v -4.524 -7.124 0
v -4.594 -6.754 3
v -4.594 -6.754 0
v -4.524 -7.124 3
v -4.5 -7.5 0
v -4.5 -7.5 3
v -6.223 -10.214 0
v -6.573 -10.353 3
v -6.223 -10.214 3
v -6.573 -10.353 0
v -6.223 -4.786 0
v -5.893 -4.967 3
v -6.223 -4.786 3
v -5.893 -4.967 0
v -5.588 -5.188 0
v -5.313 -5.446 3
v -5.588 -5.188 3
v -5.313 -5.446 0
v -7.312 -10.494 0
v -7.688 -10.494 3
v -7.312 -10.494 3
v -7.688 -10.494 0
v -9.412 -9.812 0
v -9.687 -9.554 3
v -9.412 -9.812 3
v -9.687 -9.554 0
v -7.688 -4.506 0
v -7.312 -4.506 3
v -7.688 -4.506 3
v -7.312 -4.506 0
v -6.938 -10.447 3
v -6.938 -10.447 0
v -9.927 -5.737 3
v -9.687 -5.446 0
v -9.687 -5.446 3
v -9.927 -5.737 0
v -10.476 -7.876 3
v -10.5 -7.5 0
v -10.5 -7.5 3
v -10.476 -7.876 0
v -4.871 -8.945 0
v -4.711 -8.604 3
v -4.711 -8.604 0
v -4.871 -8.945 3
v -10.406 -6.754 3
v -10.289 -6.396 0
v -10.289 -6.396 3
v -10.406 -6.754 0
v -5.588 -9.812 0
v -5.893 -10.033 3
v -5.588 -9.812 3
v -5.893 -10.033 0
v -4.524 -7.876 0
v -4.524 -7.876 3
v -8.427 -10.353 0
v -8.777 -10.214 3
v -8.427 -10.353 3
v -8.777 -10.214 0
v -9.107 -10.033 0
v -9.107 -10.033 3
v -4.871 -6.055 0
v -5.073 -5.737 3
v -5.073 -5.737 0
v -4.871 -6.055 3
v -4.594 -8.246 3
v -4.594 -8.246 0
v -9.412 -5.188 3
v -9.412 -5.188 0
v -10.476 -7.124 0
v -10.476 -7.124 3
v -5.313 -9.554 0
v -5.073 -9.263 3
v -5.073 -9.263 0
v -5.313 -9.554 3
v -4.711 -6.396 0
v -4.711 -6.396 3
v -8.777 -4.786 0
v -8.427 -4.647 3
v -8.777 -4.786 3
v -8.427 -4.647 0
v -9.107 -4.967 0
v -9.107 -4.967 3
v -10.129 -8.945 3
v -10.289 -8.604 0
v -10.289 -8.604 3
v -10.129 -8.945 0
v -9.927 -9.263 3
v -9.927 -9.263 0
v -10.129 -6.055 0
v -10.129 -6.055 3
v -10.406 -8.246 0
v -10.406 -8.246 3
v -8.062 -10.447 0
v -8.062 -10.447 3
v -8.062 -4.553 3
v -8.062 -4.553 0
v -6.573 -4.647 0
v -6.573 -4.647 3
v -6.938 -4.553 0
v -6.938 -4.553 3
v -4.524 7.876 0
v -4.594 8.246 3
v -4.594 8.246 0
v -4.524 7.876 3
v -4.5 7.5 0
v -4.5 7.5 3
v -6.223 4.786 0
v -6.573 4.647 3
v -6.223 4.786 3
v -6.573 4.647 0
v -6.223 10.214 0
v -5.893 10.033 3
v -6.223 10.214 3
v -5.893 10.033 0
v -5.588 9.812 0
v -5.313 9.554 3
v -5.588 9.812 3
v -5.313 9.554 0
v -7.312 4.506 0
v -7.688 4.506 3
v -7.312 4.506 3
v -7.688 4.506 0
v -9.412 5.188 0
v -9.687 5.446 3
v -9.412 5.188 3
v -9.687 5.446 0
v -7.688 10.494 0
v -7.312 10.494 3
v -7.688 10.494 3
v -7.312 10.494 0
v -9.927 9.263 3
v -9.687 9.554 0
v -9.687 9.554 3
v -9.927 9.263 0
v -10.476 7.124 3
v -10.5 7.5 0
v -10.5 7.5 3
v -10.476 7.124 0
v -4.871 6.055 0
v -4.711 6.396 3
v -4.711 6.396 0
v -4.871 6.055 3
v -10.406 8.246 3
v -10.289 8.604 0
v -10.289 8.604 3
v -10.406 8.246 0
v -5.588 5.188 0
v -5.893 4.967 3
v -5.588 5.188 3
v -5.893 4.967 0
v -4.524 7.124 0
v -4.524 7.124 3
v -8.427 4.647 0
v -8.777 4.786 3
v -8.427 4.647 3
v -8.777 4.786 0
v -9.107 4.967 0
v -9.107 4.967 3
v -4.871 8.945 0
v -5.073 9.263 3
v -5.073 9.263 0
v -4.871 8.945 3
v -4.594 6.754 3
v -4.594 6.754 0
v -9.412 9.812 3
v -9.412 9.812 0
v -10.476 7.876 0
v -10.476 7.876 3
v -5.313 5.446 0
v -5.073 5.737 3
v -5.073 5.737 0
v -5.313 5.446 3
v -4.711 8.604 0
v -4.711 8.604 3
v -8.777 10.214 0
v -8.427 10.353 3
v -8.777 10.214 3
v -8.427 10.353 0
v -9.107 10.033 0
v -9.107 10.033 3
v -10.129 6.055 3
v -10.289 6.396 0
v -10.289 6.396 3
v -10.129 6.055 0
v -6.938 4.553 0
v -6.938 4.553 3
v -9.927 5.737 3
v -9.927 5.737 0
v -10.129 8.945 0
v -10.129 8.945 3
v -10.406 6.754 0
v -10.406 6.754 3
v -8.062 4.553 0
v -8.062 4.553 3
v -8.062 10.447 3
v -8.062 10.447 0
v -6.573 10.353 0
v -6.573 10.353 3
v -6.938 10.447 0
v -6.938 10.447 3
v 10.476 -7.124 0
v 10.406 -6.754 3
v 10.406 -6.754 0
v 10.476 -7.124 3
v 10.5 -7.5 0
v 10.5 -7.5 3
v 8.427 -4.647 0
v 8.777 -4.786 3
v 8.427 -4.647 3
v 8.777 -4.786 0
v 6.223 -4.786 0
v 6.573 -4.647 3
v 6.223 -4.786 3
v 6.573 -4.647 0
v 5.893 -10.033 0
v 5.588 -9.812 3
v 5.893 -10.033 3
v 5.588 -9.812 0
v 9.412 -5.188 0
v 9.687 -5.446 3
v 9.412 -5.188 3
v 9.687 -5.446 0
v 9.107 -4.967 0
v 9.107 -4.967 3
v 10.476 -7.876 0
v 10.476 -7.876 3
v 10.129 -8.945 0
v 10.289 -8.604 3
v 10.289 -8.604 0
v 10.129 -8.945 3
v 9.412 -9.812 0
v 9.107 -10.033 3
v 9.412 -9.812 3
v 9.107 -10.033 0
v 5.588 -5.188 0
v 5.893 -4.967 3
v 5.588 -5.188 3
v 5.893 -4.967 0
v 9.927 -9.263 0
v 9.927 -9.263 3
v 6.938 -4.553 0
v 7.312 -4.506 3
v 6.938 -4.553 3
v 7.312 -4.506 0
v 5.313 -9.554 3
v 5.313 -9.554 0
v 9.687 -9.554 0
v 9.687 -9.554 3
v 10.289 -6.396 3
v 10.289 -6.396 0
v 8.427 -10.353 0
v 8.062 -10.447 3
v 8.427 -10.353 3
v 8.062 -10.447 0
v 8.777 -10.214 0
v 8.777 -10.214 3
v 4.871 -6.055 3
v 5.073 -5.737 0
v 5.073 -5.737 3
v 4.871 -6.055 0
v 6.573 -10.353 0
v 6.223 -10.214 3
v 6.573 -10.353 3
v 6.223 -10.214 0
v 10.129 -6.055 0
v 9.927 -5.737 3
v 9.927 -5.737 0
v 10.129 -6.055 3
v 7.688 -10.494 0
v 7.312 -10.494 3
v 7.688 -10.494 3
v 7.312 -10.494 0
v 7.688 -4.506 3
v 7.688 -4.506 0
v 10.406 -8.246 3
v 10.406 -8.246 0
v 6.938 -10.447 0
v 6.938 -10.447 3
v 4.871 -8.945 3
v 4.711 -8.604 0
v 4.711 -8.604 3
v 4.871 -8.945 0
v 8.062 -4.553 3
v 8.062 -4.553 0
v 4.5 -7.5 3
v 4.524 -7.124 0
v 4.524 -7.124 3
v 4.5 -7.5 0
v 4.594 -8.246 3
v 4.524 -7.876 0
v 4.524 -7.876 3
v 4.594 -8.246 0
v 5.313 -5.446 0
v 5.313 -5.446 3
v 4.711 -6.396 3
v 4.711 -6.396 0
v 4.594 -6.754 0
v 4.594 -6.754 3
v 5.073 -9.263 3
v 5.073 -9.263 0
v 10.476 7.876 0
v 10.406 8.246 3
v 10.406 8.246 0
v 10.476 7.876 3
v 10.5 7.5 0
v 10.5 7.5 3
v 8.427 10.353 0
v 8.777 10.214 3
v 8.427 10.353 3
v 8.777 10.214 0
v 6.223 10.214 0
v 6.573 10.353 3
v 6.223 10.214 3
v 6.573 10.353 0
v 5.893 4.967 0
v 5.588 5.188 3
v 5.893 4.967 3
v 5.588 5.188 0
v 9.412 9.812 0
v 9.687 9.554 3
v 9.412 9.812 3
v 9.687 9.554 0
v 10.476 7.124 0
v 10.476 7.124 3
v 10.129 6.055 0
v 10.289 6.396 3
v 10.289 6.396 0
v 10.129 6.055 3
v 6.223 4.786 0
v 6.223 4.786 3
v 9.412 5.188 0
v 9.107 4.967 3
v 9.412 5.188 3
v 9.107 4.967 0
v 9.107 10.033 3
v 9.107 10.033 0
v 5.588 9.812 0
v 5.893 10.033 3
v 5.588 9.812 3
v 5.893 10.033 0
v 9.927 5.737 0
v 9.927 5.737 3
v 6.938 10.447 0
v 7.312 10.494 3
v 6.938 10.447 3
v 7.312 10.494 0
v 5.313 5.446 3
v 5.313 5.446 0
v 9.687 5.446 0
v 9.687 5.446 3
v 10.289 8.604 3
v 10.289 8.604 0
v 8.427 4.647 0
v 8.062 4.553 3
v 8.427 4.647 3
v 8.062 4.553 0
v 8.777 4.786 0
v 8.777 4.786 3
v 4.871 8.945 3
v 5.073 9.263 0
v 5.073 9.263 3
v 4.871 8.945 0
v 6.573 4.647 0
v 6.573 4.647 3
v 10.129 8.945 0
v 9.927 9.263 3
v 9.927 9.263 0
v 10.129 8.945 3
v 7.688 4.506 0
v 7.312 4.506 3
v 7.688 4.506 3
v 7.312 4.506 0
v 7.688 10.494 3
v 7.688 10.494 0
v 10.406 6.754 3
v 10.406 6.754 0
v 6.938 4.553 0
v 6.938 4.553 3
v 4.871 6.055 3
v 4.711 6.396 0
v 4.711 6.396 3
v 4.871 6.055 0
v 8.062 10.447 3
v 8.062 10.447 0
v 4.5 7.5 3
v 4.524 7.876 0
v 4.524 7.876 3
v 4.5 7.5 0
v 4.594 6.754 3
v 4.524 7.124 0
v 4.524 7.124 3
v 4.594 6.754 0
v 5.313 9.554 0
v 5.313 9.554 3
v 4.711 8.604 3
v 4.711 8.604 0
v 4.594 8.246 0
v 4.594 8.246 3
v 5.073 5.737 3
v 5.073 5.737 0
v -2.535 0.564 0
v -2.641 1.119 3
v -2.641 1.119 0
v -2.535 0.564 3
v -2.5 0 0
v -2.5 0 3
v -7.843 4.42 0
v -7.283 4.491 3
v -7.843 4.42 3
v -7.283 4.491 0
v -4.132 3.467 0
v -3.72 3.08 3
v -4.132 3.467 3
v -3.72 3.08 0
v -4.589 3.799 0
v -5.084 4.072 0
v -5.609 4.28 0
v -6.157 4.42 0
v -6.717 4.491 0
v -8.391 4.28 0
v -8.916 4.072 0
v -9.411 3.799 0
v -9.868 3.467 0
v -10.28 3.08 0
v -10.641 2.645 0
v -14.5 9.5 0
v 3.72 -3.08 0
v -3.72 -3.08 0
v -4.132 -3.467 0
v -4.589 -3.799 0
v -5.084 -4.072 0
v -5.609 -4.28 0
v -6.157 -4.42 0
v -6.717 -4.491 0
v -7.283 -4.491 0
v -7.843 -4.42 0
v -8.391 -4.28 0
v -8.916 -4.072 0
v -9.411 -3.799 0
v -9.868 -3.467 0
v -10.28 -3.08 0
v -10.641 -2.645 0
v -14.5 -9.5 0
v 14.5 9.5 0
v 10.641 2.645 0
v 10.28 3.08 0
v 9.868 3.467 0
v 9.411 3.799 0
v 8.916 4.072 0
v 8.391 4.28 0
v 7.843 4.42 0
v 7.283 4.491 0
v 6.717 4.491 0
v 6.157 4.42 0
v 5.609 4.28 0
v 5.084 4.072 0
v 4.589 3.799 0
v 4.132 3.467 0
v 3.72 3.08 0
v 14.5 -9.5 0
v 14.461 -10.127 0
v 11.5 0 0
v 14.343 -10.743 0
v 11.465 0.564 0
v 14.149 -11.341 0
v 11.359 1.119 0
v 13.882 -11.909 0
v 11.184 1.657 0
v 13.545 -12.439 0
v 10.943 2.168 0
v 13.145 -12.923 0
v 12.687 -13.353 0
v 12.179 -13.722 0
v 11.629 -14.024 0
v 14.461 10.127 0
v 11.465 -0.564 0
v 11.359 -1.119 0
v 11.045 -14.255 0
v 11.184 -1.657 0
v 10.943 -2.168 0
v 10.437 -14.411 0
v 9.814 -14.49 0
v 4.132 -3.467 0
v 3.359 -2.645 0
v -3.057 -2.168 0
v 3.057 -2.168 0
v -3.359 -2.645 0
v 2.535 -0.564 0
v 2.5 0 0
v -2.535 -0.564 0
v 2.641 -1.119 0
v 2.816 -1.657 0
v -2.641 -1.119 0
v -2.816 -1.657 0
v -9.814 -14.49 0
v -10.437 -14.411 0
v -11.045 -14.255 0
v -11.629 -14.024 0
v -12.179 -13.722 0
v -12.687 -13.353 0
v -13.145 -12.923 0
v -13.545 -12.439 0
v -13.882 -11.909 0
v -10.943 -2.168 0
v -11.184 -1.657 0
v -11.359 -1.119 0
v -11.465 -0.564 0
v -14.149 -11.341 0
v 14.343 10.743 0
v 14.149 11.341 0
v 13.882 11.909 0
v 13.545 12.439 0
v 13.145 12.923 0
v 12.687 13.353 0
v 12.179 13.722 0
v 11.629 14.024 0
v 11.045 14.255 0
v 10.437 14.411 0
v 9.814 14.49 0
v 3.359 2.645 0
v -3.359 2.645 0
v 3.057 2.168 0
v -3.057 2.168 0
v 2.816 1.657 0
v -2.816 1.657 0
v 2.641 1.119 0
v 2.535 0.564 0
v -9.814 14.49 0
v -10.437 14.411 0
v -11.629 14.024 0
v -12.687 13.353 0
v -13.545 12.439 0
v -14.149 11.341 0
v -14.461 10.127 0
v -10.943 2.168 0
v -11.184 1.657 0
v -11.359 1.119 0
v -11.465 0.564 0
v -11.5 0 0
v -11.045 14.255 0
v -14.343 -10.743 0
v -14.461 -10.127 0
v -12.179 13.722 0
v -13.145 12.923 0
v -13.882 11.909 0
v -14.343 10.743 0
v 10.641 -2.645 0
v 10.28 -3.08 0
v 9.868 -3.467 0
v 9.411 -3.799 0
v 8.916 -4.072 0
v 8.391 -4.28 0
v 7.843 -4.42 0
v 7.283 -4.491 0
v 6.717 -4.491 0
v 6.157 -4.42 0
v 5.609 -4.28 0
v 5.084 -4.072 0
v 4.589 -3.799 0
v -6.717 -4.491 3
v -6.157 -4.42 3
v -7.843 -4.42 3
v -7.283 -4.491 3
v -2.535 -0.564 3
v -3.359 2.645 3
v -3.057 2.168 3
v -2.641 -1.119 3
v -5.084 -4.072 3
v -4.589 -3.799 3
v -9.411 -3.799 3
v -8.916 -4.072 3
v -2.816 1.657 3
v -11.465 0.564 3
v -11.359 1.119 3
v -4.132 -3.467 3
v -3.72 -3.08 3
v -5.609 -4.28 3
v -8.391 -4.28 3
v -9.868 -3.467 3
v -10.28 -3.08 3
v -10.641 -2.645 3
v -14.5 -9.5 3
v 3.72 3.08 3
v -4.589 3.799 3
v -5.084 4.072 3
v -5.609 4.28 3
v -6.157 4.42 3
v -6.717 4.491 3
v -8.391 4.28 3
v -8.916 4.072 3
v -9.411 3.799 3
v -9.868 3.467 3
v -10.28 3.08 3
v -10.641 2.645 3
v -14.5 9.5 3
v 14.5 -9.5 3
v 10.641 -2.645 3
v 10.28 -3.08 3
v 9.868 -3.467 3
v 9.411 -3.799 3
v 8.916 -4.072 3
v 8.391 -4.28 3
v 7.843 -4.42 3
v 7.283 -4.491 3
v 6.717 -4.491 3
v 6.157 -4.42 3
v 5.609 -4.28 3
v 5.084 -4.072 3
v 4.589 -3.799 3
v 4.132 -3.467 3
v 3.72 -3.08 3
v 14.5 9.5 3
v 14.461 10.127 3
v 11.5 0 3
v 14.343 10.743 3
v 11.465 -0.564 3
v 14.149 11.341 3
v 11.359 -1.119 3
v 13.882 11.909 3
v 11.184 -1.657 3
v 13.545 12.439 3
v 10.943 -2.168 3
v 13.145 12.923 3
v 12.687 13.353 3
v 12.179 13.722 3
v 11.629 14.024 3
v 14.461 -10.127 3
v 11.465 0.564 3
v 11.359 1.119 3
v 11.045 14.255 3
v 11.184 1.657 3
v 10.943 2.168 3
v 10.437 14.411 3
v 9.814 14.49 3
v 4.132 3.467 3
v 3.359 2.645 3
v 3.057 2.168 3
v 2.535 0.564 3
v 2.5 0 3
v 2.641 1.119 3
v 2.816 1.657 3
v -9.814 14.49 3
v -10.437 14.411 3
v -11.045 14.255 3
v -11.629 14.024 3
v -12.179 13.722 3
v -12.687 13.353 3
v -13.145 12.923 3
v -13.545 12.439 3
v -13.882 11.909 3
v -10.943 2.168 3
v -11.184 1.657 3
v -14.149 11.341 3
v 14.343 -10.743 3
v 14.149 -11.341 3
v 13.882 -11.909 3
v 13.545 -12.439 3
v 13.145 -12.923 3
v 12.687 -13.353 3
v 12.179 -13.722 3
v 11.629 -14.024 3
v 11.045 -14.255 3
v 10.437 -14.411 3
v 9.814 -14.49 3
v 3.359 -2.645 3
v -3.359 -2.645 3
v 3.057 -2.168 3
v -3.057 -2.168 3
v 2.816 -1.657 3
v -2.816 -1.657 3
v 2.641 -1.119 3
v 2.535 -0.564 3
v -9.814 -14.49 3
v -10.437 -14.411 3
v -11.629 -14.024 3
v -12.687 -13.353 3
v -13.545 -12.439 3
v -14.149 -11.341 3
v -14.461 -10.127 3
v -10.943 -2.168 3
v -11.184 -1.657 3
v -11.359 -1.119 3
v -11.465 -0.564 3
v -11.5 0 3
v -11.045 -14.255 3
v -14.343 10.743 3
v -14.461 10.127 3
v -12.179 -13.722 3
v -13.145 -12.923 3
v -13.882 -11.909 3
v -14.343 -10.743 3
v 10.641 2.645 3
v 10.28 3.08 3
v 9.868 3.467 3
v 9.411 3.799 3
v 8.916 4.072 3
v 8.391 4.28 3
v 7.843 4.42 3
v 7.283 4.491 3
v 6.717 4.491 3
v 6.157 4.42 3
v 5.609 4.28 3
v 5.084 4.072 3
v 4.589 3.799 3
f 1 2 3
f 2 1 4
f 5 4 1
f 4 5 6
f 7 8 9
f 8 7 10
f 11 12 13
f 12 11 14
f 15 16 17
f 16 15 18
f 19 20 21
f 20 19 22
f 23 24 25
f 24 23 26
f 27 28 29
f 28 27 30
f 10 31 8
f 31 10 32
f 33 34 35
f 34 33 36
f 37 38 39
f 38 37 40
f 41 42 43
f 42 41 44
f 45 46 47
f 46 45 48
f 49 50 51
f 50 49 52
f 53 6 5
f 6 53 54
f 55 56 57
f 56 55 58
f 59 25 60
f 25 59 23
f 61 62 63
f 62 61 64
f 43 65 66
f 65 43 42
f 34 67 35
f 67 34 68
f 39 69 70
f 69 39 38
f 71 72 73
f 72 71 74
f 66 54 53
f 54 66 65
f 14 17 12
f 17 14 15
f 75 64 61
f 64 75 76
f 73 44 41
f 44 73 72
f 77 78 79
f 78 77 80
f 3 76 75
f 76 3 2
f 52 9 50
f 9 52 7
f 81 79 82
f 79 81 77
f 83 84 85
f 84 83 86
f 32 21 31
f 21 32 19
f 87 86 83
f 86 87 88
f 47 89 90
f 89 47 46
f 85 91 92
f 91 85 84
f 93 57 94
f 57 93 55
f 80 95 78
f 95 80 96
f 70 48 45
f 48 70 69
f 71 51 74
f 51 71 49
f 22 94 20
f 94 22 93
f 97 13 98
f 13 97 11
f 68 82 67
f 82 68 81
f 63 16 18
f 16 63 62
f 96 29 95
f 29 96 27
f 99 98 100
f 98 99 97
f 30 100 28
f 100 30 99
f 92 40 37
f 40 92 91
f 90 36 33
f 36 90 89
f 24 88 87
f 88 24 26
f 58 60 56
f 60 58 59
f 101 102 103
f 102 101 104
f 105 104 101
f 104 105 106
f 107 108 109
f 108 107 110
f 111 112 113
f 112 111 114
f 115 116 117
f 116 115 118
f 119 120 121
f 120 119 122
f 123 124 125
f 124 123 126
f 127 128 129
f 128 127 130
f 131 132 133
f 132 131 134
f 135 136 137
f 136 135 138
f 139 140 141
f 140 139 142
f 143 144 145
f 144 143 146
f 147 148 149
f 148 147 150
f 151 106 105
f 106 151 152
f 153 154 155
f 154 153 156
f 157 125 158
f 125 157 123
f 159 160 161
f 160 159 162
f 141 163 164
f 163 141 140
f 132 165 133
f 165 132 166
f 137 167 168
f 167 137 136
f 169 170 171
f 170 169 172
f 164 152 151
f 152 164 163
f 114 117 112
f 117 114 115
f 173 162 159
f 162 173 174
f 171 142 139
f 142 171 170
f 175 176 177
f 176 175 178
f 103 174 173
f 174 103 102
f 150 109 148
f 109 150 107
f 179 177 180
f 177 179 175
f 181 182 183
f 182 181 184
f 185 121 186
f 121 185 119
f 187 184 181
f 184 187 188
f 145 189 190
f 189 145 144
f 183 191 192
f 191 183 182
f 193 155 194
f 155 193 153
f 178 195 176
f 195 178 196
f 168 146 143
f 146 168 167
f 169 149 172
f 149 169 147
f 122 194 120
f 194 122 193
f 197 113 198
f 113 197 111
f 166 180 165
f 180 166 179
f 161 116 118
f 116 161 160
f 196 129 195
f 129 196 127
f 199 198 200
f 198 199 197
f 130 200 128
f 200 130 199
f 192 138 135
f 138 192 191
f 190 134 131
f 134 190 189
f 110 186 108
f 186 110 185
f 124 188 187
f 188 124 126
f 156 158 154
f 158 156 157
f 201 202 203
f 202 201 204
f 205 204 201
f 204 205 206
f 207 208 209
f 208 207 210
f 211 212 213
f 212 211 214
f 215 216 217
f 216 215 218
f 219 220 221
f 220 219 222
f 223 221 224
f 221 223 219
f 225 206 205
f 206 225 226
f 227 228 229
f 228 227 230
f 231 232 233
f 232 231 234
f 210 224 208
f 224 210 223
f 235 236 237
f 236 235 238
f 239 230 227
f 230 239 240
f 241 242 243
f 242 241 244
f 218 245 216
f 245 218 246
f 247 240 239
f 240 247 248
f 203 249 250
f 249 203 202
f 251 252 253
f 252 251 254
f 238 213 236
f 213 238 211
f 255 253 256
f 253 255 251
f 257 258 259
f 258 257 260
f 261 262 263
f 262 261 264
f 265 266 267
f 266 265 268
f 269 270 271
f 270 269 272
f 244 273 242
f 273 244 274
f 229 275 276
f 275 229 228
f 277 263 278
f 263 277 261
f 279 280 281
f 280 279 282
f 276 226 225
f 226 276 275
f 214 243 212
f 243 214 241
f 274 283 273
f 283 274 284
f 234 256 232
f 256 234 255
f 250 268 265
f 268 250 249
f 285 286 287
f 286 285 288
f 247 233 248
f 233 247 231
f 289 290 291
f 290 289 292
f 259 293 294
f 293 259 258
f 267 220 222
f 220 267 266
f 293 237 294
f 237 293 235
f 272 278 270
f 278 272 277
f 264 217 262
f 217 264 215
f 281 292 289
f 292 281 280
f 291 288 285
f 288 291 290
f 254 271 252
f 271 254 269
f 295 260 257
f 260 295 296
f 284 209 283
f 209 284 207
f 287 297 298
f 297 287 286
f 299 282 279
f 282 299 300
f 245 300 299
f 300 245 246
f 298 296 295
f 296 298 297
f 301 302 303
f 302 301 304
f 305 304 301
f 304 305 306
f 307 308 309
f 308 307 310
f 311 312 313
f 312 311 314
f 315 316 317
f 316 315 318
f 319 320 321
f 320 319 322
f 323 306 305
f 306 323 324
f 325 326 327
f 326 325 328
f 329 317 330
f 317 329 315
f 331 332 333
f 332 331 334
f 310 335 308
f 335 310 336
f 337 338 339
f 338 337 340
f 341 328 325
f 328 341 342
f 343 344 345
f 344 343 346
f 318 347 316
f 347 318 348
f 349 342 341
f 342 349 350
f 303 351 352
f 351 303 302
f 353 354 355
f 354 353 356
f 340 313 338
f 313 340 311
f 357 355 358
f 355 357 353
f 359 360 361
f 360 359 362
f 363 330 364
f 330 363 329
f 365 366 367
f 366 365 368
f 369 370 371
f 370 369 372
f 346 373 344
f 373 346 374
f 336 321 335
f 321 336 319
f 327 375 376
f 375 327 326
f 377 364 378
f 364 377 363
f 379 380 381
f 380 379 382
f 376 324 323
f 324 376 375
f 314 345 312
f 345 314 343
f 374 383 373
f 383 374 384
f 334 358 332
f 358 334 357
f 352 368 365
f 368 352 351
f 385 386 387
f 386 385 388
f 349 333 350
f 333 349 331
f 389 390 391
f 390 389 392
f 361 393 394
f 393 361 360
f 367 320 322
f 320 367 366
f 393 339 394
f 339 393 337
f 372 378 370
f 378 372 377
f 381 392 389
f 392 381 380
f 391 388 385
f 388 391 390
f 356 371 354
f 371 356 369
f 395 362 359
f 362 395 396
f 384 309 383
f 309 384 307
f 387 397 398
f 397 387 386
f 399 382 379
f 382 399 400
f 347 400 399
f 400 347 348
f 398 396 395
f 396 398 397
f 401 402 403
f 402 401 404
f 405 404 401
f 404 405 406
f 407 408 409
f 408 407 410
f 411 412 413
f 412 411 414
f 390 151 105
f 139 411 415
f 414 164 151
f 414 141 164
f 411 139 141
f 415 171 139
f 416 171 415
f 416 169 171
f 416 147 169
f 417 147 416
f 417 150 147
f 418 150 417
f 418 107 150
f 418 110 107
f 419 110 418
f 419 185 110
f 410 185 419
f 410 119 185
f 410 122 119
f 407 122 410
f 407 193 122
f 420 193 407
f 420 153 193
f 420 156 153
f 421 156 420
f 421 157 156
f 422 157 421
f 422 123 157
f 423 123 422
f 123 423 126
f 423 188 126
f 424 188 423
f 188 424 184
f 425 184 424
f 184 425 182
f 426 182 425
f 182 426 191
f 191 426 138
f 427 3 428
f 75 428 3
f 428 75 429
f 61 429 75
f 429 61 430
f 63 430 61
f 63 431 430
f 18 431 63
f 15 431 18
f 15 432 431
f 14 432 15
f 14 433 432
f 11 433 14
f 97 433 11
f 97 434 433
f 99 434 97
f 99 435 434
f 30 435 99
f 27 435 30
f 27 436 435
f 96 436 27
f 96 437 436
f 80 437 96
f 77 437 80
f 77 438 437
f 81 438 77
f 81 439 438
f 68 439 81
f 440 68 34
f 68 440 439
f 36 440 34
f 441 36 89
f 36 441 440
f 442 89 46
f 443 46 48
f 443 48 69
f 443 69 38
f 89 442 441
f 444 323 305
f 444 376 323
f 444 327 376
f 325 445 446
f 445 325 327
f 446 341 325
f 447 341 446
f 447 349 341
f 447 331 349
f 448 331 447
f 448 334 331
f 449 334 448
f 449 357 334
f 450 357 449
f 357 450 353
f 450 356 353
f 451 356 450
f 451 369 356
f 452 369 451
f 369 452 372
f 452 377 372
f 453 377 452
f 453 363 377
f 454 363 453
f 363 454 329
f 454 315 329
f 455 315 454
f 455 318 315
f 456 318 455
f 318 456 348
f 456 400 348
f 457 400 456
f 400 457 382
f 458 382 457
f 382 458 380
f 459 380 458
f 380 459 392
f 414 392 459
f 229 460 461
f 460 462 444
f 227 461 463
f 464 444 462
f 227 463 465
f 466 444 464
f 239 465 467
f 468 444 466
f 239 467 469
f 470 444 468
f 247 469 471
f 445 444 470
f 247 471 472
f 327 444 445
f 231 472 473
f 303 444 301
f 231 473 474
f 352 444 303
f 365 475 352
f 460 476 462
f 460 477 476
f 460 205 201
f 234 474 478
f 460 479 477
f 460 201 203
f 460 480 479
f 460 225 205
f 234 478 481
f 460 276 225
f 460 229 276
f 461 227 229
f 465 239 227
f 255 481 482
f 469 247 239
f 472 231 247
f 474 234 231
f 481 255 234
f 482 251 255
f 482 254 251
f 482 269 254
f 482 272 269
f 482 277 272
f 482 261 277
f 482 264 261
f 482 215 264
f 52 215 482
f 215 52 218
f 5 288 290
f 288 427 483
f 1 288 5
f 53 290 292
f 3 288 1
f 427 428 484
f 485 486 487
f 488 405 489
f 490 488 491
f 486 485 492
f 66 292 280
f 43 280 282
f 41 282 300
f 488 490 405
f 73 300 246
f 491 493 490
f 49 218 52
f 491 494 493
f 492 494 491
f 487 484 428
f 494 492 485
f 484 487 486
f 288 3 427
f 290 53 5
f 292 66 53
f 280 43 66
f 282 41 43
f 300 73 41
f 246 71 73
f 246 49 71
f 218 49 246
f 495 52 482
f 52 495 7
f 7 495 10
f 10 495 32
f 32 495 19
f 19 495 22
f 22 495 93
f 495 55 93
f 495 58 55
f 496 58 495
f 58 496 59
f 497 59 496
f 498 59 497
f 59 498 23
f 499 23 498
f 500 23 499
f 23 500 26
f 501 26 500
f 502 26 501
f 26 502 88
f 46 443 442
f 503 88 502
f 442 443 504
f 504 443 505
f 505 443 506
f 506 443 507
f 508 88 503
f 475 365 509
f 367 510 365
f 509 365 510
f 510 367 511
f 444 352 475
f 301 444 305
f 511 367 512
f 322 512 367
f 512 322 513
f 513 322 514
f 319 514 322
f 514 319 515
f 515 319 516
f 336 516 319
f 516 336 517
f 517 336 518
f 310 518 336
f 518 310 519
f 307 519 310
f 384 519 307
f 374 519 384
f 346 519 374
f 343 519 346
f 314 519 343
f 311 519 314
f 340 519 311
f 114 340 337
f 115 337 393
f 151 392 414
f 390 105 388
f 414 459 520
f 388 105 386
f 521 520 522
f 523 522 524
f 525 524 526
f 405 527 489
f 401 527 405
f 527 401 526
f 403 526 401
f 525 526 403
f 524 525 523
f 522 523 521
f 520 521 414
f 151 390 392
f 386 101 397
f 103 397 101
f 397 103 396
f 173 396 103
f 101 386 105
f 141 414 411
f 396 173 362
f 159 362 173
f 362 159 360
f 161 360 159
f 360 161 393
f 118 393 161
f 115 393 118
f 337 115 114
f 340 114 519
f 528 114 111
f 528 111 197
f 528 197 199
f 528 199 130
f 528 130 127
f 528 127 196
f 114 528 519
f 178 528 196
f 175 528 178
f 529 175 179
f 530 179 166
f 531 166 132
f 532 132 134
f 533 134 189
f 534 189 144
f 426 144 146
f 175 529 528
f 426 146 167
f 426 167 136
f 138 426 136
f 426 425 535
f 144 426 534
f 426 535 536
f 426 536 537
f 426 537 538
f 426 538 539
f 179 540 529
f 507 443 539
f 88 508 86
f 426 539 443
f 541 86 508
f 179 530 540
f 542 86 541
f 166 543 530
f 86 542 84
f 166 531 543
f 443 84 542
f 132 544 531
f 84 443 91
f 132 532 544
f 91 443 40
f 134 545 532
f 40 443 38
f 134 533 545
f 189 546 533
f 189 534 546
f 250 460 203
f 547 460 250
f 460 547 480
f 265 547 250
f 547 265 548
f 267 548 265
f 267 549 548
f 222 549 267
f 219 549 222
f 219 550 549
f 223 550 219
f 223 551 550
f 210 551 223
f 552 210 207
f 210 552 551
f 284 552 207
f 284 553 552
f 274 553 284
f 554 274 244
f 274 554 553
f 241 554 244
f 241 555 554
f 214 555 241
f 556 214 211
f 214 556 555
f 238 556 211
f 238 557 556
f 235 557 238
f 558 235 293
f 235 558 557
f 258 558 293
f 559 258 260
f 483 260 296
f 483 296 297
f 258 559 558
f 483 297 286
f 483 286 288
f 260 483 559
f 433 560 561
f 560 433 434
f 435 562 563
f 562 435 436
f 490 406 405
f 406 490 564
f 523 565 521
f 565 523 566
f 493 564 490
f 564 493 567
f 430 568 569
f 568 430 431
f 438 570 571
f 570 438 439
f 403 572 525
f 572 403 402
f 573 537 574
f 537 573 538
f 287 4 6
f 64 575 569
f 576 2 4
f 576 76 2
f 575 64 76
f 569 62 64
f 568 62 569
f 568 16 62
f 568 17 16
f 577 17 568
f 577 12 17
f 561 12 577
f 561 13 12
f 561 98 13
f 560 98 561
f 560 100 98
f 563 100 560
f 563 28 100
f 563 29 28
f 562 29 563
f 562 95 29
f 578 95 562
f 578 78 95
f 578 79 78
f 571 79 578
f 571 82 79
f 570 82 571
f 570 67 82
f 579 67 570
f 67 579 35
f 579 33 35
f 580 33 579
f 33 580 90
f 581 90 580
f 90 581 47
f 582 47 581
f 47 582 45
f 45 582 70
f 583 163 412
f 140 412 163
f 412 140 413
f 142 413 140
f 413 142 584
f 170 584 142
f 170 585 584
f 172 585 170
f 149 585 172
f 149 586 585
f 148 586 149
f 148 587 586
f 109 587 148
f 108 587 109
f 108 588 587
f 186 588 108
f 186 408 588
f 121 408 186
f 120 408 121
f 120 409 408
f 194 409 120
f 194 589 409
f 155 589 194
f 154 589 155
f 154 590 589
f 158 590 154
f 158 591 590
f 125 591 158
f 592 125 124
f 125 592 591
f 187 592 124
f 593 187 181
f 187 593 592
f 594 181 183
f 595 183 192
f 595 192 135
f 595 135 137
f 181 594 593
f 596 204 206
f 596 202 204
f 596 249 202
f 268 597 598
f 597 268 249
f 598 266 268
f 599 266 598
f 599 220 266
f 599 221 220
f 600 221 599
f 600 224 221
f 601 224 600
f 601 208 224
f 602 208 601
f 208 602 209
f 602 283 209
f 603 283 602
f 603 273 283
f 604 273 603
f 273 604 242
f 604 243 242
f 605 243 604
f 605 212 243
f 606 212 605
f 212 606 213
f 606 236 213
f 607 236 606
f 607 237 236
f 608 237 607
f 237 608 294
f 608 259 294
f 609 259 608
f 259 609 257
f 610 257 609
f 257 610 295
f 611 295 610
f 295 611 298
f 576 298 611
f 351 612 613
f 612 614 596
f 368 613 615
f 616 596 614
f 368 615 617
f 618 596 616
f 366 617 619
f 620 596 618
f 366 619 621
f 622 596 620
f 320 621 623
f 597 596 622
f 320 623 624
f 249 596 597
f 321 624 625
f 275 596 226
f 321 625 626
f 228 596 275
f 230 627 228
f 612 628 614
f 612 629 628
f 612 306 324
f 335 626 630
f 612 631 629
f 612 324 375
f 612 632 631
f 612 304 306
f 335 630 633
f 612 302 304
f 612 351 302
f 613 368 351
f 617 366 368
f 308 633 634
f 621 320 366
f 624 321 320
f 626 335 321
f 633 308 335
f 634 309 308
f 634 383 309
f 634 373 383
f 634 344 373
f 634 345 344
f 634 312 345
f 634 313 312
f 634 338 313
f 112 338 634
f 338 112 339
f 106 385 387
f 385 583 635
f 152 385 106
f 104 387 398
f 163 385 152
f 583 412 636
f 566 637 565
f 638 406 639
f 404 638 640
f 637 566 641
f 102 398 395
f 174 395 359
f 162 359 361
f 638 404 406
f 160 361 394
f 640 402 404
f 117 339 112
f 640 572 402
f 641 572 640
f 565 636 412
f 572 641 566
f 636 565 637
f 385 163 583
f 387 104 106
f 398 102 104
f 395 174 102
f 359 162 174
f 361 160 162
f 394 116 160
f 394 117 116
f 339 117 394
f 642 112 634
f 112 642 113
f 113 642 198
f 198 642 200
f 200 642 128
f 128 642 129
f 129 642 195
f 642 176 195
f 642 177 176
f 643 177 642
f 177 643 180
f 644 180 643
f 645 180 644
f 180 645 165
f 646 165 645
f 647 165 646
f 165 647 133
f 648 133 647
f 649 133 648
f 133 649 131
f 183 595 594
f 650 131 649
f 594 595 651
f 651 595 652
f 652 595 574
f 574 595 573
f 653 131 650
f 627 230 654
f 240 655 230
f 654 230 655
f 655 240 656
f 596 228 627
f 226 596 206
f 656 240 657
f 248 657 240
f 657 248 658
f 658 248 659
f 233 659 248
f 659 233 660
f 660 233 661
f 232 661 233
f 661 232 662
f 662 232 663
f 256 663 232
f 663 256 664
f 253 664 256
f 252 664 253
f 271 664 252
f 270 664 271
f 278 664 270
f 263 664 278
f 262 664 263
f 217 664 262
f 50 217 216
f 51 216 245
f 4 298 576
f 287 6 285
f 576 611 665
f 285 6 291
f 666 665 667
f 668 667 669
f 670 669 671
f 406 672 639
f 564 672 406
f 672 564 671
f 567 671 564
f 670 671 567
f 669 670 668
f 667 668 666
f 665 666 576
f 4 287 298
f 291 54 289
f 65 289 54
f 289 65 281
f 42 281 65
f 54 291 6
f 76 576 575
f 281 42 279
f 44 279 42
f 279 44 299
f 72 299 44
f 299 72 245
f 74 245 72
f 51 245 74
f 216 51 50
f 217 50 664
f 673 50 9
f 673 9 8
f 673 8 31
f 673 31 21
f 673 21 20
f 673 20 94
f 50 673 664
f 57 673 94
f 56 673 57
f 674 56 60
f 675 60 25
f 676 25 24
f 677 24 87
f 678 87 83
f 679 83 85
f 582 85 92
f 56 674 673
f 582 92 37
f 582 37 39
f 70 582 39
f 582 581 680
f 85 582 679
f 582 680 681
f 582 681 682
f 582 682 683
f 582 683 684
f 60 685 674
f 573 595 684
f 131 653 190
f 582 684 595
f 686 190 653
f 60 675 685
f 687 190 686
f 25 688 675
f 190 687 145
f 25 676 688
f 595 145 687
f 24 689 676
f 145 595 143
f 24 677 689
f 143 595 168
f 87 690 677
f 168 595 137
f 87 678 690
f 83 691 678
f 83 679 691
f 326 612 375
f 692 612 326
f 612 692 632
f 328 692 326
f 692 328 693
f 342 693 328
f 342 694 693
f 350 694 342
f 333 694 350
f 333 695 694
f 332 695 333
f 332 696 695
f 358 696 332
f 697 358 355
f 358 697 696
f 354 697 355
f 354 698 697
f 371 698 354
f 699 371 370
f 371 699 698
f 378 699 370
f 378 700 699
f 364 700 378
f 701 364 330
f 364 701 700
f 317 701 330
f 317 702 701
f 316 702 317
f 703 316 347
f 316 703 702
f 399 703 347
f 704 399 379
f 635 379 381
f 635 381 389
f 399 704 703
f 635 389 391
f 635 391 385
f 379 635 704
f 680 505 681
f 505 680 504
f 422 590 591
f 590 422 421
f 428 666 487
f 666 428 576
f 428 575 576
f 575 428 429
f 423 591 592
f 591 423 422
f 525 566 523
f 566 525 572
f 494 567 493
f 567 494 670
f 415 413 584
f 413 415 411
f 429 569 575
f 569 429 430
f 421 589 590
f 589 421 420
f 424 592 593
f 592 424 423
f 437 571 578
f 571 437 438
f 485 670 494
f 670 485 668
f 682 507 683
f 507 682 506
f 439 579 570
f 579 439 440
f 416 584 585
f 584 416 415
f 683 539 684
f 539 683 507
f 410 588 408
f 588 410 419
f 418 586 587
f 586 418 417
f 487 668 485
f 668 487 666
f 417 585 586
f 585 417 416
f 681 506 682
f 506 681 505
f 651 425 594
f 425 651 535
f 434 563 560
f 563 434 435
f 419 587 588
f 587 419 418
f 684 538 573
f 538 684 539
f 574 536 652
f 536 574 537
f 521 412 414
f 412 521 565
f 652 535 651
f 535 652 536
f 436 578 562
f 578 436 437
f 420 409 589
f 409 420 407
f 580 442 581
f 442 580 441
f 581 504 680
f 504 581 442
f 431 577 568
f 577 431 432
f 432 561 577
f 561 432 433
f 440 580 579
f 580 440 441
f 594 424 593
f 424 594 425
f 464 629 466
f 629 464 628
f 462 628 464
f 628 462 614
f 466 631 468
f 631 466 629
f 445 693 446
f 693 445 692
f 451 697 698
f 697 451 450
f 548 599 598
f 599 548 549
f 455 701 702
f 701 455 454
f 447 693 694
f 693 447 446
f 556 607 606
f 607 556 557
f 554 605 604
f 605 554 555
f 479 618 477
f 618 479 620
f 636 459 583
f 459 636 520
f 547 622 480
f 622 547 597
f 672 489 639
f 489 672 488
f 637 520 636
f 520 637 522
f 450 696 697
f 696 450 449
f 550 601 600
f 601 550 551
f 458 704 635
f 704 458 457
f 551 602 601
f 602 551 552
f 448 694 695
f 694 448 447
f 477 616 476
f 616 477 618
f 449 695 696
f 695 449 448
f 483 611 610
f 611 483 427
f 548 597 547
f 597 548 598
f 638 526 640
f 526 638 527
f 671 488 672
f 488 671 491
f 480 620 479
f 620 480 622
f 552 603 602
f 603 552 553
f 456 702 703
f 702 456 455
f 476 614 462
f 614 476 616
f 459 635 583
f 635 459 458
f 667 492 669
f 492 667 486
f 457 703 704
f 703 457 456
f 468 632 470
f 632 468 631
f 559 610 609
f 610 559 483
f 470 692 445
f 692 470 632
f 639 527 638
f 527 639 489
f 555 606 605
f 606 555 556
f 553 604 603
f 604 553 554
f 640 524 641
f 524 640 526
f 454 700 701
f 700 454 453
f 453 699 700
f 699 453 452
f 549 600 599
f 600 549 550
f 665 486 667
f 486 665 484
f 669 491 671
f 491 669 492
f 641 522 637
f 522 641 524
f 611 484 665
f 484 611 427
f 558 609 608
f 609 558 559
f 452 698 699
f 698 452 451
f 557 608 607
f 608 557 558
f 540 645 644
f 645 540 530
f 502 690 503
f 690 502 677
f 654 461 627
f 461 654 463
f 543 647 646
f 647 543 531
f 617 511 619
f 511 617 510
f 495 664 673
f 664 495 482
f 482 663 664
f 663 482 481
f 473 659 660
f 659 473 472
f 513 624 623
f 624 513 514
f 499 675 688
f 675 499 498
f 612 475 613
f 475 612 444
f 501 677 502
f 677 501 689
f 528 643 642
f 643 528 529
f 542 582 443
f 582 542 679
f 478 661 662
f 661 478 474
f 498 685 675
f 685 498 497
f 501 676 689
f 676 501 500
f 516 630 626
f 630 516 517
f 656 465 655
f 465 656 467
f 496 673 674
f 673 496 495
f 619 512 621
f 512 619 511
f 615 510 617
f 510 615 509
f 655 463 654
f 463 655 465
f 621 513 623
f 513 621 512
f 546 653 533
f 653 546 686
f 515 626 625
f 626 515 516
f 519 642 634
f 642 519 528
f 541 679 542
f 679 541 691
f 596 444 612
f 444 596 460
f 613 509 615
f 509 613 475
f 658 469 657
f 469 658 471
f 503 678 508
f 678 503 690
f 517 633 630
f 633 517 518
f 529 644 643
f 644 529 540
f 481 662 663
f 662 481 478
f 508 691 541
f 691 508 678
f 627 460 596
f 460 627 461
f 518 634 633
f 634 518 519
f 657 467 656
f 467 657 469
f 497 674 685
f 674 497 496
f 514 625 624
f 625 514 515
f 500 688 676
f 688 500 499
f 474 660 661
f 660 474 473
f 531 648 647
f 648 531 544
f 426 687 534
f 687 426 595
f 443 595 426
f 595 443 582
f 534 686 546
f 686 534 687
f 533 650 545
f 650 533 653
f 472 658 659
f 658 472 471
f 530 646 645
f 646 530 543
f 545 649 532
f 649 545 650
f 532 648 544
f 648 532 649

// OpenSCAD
$fn = 50;


difference() {
	union() {
		hull() {
			translate(v = [-9.5000000000, 9.5000000000, 0]) {
				cylinder(h = 3, r = 5);
			}
			translate(v = [9.5000000000, 9.5000000000, 0]) {
				cylinder(h = 3, r = 5);
			}
			translate(v = [-9.5000000000, -9.5000000000, 0]) {
				cylinder(h = 3, r = 5);
			}
			translate(v = [9.5000000000, -9.5000000000, 0]) {
				cylinder(h = 3, r = 5);
			}
		}
	}
	union() {
		#translate(v = [-7.5000000000, -7.5000000000, -100.0000000000]) {
			cylinder(h = 200, r = 3.0000000000);
		}
		#translate(v = [-7.5000000000, 7.5000000000, -100.0000000000]) {
			cylinder(h = 200, r = 3.0000000000);
		}
		#translate(v = [7.5000000000, -7.5000000000, -100.0000000000]) {
			cylinder(h = 200, r = 3.0000000000);
		}
		#translate(v = [7.5000000000, 7.5000000000, -100.0000000000]) {
			cylinder(h = 200, r = 3.0000000000);
		}
		#translate(v = [-7.0000000000, 0, 0]) {
			cylinder(h = 3, r = 4.5000000000);
		}
		#translate(v = [7.0000000000, 0, 0]) {
			cylinder(h = 3, r = 4.5000000000);
		}
	}
}
